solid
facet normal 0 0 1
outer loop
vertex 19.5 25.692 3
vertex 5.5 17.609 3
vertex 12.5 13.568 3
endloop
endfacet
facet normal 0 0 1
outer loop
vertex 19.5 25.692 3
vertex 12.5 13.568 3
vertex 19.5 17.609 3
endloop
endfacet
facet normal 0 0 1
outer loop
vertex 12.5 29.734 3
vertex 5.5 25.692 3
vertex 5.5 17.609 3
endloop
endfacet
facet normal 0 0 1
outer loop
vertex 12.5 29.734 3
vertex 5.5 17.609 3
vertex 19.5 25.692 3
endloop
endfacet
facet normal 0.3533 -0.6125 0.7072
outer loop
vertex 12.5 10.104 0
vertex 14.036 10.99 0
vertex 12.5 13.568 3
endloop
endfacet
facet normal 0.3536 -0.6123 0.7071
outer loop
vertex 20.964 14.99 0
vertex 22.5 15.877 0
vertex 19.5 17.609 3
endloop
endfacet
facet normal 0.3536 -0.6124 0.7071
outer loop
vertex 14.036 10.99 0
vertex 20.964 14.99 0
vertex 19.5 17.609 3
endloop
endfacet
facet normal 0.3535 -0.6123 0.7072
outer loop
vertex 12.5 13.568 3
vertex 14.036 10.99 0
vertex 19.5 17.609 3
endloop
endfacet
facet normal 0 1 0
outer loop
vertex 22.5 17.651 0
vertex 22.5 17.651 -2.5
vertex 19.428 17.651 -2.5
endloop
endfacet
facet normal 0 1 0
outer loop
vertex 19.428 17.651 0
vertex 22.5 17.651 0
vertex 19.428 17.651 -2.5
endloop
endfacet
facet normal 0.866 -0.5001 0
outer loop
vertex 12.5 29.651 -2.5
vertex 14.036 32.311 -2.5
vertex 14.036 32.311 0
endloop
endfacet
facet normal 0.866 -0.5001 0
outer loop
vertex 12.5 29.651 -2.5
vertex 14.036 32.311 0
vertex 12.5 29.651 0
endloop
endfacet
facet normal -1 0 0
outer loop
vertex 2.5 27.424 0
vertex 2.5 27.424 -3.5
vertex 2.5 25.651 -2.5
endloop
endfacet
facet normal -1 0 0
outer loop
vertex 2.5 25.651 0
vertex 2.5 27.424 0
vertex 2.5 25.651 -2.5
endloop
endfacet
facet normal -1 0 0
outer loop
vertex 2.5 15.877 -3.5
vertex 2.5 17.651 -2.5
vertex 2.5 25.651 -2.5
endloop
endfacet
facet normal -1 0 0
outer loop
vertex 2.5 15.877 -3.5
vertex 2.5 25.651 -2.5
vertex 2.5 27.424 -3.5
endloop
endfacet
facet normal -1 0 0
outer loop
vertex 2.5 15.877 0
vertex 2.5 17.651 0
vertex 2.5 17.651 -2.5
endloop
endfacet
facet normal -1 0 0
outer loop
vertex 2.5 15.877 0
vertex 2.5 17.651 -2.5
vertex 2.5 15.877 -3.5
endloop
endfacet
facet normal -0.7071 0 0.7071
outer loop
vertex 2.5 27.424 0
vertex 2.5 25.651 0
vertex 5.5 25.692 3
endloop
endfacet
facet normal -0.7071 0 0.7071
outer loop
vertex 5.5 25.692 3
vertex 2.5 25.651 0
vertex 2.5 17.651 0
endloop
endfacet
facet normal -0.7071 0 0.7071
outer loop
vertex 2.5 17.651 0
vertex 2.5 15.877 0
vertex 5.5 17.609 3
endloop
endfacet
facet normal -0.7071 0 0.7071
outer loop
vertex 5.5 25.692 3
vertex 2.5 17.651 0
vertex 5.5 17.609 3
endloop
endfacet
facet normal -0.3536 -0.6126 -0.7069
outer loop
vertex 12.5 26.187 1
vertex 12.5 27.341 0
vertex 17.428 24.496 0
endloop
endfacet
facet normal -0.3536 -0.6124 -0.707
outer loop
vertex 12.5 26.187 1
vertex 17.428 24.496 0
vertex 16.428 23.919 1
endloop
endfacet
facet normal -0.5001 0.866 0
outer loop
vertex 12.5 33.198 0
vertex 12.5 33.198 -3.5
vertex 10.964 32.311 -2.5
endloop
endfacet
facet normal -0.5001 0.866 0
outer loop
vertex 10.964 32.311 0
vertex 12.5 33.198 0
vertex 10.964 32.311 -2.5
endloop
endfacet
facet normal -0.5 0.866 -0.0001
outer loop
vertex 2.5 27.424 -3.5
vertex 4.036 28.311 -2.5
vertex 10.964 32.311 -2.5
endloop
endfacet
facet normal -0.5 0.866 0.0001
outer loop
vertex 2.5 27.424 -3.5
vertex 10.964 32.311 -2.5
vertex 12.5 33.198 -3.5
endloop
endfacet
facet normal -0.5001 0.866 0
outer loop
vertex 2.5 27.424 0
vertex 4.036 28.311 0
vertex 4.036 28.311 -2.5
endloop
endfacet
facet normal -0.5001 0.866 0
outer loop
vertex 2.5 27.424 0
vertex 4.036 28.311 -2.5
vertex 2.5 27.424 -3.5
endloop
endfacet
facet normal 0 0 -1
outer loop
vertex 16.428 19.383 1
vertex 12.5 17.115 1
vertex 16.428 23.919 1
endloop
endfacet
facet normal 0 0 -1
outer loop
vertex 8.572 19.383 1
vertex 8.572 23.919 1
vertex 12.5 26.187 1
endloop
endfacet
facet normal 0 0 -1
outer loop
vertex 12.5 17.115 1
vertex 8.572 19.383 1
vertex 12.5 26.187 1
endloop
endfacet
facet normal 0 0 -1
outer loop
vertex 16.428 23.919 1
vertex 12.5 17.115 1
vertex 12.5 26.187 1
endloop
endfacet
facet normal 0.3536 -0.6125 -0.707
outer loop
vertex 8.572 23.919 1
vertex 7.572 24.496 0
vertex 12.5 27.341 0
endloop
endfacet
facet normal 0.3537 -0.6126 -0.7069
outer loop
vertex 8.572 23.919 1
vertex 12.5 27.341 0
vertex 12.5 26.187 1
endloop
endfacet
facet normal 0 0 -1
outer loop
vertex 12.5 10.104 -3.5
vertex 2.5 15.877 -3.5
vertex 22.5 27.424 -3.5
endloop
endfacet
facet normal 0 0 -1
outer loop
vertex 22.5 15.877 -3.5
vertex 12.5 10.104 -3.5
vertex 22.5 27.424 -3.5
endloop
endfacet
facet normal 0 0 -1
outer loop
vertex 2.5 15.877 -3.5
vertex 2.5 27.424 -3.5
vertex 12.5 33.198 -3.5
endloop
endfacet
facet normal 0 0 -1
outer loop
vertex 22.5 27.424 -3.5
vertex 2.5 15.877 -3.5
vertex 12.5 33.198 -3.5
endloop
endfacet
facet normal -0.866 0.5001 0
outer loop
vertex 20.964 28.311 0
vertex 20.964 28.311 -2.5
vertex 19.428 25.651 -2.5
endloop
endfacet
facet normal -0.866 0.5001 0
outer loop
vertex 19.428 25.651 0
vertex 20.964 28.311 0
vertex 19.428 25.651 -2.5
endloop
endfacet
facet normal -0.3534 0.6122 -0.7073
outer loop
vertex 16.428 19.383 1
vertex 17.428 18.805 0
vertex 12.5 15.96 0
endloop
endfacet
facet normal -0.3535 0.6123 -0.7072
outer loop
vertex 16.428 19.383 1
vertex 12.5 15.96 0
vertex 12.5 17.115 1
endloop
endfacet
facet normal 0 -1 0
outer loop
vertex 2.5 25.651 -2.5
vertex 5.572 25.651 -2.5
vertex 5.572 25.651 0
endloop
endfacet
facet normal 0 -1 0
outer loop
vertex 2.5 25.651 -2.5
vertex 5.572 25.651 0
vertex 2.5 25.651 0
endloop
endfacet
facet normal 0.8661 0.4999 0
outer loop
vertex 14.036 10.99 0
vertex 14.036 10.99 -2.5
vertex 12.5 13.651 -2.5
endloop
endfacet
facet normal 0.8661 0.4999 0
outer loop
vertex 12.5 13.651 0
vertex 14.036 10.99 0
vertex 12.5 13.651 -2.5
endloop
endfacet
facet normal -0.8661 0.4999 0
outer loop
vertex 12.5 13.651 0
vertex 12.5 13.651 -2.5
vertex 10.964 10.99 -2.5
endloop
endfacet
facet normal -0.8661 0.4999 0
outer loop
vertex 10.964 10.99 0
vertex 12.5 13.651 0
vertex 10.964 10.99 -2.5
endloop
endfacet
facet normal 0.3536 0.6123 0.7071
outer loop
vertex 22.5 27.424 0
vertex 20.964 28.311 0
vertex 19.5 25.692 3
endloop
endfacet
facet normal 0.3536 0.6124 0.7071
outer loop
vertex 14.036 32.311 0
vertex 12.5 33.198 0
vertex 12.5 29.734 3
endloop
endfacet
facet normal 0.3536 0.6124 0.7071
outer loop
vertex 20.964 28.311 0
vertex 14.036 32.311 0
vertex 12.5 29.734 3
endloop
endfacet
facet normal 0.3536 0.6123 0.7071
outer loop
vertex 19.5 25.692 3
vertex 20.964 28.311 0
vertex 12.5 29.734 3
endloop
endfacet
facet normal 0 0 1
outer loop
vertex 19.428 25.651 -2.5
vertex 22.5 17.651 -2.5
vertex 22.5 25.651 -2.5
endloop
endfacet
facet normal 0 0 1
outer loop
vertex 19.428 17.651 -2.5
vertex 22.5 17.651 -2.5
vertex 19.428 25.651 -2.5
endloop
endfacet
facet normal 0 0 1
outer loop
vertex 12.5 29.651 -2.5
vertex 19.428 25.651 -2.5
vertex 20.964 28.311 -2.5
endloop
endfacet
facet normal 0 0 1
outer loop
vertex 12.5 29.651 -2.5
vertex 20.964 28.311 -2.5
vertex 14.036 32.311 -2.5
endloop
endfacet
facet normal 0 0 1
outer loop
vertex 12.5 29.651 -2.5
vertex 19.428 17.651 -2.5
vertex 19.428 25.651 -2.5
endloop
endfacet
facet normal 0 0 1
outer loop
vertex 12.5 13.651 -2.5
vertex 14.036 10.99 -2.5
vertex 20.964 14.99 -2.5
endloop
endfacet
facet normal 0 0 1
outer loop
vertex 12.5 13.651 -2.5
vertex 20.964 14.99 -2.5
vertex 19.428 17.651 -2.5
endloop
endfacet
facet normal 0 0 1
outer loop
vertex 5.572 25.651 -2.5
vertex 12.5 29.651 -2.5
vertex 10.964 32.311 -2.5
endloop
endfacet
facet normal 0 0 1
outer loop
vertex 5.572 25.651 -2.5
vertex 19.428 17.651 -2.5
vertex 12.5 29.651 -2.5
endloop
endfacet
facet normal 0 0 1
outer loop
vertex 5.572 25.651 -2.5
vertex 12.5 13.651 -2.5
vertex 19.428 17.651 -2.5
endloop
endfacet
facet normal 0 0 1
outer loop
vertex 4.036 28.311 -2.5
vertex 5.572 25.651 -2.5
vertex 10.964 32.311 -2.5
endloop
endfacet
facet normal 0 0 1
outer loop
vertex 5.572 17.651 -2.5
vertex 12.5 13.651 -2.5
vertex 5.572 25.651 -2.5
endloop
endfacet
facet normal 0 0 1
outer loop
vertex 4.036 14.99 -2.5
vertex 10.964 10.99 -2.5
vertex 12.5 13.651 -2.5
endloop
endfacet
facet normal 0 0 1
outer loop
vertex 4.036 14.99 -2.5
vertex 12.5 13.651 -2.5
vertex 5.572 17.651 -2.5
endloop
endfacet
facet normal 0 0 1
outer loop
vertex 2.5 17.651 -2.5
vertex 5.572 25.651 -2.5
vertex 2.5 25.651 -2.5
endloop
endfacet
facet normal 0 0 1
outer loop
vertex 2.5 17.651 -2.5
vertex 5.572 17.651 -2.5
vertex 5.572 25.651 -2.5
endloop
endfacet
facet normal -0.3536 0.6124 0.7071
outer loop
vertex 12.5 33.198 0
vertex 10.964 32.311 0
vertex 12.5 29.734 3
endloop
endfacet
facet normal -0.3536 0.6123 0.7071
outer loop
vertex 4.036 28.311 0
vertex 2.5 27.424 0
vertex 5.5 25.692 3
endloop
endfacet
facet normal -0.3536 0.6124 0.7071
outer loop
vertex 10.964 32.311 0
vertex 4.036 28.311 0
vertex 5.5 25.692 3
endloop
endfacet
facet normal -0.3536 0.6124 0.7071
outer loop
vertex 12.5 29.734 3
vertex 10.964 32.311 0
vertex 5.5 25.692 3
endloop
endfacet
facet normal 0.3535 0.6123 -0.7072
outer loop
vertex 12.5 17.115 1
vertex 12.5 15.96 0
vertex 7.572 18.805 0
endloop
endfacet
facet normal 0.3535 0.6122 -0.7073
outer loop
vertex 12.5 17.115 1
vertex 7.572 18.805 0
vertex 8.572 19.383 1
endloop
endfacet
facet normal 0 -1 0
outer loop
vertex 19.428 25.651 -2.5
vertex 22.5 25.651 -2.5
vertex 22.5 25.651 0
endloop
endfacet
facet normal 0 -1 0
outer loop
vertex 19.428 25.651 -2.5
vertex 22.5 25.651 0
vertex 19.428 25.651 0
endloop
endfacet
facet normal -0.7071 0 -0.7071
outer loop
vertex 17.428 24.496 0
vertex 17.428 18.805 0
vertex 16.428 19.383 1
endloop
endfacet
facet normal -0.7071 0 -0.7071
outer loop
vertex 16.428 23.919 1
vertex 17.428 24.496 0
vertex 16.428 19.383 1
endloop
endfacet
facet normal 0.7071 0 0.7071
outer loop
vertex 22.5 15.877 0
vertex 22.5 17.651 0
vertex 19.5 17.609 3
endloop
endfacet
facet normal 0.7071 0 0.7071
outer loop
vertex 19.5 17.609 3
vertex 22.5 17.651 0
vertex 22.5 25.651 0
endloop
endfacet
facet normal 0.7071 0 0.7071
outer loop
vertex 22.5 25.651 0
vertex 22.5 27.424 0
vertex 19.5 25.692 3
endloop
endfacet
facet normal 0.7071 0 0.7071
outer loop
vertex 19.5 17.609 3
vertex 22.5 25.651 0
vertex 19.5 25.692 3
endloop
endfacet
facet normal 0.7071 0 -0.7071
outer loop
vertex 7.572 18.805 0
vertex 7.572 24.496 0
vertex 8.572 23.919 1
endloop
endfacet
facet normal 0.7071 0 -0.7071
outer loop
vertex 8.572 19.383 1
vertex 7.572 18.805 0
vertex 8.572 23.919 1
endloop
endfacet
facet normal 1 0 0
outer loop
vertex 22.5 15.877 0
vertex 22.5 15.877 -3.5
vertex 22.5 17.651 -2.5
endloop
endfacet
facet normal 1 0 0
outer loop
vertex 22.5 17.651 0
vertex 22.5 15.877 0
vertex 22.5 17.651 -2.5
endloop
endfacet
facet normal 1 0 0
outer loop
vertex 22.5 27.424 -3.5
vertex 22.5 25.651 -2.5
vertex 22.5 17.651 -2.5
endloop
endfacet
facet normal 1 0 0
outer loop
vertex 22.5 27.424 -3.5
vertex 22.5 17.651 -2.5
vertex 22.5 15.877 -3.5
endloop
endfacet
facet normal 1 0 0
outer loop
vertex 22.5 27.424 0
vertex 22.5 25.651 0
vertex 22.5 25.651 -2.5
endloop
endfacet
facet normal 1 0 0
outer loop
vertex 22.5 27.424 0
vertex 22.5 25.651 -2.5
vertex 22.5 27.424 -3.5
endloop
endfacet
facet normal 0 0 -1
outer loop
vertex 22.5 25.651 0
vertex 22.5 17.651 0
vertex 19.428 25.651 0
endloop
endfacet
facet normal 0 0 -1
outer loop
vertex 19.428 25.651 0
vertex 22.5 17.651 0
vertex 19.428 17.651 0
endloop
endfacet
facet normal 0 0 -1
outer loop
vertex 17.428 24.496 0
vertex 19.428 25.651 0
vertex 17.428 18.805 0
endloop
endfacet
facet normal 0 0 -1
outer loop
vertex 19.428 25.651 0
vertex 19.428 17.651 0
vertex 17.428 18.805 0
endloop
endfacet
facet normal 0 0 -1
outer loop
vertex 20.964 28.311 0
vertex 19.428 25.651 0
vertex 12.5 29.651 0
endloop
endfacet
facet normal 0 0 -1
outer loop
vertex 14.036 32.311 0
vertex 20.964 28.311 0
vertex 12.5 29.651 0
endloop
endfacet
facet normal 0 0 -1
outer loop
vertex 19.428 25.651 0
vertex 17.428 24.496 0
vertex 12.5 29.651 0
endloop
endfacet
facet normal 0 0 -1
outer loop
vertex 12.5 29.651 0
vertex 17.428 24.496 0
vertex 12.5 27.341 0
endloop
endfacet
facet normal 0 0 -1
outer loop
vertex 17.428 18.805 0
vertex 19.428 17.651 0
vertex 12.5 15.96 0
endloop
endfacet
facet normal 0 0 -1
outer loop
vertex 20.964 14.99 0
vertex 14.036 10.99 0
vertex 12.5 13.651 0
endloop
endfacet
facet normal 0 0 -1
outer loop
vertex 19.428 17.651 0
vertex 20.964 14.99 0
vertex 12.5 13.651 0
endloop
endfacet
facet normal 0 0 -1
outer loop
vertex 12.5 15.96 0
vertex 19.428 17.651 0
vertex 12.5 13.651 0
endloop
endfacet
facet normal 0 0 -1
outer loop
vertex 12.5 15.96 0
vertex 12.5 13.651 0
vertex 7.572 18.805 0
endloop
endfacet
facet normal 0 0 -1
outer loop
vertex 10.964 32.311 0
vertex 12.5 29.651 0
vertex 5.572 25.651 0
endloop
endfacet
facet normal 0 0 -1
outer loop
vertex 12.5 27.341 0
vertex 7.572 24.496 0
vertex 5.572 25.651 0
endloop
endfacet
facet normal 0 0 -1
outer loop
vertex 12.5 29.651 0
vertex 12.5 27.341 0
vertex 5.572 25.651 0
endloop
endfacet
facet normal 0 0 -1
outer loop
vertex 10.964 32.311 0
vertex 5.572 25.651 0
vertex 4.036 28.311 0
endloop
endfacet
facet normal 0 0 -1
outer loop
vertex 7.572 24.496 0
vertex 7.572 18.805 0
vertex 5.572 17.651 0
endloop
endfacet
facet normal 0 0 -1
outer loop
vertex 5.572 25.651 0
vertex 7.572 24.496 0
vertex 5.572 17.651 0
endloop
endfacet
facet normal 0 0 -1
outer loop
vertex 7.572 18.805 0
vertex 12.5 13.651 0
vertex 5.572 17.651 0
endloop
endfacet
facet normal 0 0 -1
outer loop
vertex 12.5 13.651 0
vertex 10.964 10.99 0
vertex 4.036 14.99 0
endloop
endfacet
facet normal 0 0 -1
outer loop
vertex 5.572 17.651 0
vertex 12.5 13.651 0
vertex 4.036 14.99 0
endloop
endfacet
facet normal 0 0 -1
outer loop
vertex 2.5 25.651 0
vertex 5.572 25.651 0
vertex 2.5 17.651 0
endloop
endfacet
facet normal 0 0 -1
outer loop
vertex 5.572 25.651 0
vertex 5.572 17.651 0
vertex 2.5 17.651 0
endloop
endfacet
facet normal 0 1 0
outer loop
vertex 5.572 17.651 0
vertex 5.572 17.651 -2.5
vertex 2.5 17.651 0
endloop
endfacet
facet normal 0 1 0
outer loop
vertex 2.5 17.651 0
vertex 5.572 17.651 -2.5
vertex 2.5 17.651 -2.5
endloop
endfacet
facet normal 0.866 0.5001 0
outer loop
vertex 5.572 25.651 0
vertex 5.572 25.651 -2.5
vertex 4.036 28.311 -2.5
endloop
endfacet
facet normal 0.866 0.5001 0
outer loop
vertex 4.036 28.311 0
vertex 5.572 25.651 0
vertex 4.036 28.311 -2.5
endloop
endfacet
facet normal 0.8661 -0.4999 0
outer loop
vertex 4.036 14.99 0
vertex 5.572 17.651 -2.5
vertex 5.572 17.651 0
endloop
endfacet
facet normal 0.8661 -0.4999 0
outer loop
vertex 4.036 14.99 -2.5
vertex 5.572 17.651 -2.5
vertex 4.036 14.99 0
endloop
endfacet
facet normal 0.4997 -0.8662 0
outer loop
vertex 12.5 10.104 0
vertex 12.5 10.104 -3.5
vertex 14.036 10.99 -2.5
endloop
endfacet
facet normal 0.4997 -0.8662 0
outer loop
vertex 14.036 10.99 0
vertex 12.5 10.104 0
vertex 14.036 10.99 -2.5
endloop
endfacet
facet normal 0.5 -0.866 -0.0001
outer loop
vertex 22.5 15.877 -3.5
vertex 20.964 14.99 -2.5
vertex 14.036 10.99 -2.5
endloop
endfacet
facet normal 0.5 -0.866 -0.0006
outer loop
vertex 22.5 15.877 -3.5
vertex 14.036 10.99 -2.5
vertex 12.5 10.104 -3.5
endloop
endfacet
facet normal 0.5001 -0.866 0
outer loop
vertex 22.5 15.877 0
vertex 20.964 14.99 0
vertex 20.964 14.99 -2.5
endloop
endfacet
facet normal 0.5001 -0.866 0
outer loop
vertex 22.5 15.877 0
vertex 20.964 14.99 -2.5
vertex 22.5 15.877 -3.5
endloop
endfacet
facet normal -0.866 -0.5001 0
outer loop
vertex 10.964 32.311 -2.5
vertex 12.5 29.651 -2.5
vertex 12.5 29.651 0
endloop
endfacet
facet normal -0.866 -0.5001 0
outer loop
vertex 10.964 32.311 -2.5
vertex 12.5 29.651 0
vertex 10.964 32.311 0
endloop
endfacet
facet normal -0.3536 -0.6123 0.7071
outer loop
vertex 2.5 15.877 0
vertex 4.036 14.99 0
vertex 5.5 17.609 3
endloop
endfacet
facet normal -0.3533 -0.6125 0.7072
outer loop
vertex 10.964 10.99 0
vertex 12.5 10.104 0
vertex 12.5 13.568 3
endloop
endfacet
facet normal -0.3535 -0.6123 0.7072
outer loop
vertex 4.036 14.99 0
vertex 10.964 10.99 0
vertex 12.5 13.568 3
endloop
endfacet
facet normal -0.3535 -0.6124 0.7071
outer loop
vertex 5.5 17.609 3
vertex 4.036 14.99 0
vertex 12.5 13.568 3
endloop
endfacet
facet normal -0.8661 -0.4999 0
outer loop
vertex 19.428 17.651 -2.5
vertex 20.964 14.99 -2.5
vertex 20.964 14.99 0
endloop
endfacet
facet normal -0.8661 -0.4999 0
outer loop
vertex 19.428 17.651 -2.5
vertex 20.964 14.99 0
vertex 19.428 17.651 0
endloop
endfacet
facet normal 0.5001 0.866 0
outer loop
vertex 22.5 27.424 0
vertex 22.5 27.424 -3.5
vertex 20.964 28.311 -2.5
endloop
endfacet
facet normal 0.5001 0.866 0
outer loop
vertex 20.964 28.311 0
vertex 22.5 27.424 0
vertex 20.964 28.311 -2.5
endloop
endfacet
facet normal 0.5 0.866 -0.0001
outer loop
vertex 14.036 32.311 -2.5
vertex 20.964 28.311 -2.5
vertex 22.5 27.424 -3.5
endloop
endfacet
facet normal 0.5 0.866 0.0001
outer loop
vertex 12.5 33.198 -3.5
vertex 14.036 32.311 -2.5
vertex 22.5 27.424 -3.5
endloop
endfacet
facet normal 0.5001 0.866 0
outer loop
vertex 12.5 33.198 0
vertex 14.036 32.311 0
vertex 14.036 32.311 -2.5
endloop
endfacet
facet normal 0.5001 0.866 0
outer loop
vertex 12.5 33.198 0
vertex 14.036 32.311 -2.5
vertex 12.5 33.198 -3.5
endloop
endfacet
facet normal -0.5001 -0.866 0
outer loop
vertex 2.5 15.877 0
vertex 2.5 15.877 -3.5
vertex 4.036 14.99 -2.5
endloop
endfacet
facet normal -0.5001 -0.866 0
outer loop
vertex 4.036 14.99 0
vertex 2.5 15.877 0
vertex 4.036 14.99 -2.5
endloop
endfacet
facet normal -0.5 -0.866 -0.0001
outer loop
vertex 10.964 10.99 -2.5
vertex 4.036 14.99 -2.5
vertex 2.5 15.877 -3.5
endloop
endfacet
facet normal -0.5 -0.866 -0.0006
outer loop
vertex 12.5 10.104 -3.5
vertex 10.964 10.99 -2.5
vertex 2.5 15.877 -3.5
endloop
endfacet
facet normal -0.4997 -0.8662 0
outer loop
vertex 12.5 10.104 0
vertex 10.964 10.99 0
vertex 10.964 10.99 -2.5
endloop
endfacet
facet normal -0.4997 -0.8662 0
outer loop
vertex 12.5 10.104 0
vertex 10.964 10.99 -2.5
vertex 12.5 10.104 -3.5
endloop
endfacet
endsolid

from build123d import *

# Parameters (mm, degrees)
BOX001_W                    = 8
BOX001_H                    = 20
BOX001_DEPTH                = 2.5
ARRAY_COUNT                 = 3
ARRAY_ANGLE                 = 120
PAD_DEPTH                   = 3
PAD_TAPER                   = 45
PAD001_DEPTH                = 3.5
FUSION_PLACEMENT_ANGLE      = 30
BASEFEATURE_PLACEMENT_ANGLE = 30
POCKET_DEPTH                = 3
POCKET_TAPER                = 45
CUT_PLACEMENT_ANGLE         = 30


with BuildPart() as array:
    # Box001 → Box001 (new body)
    with BuildSketch(Plane(origin=(-4, -10, -2.5), x_dir=(1, 0, 0), z_dir=(0, 0, 1))):
        with Locations((4, 10)):
            Rectangle(BOX001_W, BOX001_H)
    extrude(amount=BOX001_DEPTH)

    # Array: Array ×3 about axis
    array_axis = Axis((0, 0, 0), (0, 0, 1))


with BuildPart() as array_1:
    add(array.part)
    for i in range(1, ARRAY_COUNT):
        add(array.part.rotate(array_axis, i * ARRAY_ANGLE / (ARRAY_COUNT - 1)))


with BuildPart() as pad:
    # Sketch → Pad (new body)
    with BuildSketch(Plane.XY):
        Polygon((-11.547005, 0), (-5.773503, -10), (5.773503, -10), (11.547005, 0), (5.773503, 10), (-5.773503, 10), align=None)
    extrude(amount=PAD_DEPTH, taper=PAD_TAPER)


with BuildPart() as cell001:
    # Pad001 base: copy of Pad
    add(pad.part)

    # Sketch → Pad001 (new body)
    with BuildSketch(Plane.XY):
        Polygon((-11.547005, 0), (-5.773503, -10), (5.773503, -10), (11.547005, 0), (5.773503, 10), (-5.773503, 10), align=None)
    extrude(amount=-PAD001_DEPTH)

    # Fusion: union Pad
    add(pad.part)


with BuildPart() as cell001_1:
    # Fusion placement: moved
    add(cell001.part.rotate(Axis((0, 0, 0), (0, 0, 1)), FUSION_PLACEMENT_ANGLE))


with BuildPart() as cell001_2:
    # BaseFeature placement: moved
    add(cell001_1.part.rotate(Axis((0, 0, 0), (0, 0, -1)), BASEFEATURE_PLACEMENT_ANGLE))

    # Sketch002 → Pocket (cut)
    with BuildSketch(Plane(origin=(0, 0, -2), x_dir=(0.866025, 0.5, 0), z_dir=(0, 0, 1))):
        Polygon((0, 8), (-6.928203, 4), (-6.928203, -4), (0, -8), (6.928203, -4), (6.928203, 4), align=None)
    extrude(amount=POCKET_DEPTH, taper=POCKET_TAPER, mode=Mode.SUBTRACT)

    # Cut: cut Array
    add(array_1.part, mode=Mode.SUBTRACT)


with BuildPart() as cell001_3:
    # Cut placement: moved
    add(cell001_2.part.rotate(Axis((0, 0, 0), (0, 0, 1)), CUT_PLACEMENT_ANGLE))


with BuildPart() as cell001_4:
    # Clone placement: moved
    add(cell001_3.part.moved(Location((12.5, 21.650635, 0))))


solid = cell001_4.part
